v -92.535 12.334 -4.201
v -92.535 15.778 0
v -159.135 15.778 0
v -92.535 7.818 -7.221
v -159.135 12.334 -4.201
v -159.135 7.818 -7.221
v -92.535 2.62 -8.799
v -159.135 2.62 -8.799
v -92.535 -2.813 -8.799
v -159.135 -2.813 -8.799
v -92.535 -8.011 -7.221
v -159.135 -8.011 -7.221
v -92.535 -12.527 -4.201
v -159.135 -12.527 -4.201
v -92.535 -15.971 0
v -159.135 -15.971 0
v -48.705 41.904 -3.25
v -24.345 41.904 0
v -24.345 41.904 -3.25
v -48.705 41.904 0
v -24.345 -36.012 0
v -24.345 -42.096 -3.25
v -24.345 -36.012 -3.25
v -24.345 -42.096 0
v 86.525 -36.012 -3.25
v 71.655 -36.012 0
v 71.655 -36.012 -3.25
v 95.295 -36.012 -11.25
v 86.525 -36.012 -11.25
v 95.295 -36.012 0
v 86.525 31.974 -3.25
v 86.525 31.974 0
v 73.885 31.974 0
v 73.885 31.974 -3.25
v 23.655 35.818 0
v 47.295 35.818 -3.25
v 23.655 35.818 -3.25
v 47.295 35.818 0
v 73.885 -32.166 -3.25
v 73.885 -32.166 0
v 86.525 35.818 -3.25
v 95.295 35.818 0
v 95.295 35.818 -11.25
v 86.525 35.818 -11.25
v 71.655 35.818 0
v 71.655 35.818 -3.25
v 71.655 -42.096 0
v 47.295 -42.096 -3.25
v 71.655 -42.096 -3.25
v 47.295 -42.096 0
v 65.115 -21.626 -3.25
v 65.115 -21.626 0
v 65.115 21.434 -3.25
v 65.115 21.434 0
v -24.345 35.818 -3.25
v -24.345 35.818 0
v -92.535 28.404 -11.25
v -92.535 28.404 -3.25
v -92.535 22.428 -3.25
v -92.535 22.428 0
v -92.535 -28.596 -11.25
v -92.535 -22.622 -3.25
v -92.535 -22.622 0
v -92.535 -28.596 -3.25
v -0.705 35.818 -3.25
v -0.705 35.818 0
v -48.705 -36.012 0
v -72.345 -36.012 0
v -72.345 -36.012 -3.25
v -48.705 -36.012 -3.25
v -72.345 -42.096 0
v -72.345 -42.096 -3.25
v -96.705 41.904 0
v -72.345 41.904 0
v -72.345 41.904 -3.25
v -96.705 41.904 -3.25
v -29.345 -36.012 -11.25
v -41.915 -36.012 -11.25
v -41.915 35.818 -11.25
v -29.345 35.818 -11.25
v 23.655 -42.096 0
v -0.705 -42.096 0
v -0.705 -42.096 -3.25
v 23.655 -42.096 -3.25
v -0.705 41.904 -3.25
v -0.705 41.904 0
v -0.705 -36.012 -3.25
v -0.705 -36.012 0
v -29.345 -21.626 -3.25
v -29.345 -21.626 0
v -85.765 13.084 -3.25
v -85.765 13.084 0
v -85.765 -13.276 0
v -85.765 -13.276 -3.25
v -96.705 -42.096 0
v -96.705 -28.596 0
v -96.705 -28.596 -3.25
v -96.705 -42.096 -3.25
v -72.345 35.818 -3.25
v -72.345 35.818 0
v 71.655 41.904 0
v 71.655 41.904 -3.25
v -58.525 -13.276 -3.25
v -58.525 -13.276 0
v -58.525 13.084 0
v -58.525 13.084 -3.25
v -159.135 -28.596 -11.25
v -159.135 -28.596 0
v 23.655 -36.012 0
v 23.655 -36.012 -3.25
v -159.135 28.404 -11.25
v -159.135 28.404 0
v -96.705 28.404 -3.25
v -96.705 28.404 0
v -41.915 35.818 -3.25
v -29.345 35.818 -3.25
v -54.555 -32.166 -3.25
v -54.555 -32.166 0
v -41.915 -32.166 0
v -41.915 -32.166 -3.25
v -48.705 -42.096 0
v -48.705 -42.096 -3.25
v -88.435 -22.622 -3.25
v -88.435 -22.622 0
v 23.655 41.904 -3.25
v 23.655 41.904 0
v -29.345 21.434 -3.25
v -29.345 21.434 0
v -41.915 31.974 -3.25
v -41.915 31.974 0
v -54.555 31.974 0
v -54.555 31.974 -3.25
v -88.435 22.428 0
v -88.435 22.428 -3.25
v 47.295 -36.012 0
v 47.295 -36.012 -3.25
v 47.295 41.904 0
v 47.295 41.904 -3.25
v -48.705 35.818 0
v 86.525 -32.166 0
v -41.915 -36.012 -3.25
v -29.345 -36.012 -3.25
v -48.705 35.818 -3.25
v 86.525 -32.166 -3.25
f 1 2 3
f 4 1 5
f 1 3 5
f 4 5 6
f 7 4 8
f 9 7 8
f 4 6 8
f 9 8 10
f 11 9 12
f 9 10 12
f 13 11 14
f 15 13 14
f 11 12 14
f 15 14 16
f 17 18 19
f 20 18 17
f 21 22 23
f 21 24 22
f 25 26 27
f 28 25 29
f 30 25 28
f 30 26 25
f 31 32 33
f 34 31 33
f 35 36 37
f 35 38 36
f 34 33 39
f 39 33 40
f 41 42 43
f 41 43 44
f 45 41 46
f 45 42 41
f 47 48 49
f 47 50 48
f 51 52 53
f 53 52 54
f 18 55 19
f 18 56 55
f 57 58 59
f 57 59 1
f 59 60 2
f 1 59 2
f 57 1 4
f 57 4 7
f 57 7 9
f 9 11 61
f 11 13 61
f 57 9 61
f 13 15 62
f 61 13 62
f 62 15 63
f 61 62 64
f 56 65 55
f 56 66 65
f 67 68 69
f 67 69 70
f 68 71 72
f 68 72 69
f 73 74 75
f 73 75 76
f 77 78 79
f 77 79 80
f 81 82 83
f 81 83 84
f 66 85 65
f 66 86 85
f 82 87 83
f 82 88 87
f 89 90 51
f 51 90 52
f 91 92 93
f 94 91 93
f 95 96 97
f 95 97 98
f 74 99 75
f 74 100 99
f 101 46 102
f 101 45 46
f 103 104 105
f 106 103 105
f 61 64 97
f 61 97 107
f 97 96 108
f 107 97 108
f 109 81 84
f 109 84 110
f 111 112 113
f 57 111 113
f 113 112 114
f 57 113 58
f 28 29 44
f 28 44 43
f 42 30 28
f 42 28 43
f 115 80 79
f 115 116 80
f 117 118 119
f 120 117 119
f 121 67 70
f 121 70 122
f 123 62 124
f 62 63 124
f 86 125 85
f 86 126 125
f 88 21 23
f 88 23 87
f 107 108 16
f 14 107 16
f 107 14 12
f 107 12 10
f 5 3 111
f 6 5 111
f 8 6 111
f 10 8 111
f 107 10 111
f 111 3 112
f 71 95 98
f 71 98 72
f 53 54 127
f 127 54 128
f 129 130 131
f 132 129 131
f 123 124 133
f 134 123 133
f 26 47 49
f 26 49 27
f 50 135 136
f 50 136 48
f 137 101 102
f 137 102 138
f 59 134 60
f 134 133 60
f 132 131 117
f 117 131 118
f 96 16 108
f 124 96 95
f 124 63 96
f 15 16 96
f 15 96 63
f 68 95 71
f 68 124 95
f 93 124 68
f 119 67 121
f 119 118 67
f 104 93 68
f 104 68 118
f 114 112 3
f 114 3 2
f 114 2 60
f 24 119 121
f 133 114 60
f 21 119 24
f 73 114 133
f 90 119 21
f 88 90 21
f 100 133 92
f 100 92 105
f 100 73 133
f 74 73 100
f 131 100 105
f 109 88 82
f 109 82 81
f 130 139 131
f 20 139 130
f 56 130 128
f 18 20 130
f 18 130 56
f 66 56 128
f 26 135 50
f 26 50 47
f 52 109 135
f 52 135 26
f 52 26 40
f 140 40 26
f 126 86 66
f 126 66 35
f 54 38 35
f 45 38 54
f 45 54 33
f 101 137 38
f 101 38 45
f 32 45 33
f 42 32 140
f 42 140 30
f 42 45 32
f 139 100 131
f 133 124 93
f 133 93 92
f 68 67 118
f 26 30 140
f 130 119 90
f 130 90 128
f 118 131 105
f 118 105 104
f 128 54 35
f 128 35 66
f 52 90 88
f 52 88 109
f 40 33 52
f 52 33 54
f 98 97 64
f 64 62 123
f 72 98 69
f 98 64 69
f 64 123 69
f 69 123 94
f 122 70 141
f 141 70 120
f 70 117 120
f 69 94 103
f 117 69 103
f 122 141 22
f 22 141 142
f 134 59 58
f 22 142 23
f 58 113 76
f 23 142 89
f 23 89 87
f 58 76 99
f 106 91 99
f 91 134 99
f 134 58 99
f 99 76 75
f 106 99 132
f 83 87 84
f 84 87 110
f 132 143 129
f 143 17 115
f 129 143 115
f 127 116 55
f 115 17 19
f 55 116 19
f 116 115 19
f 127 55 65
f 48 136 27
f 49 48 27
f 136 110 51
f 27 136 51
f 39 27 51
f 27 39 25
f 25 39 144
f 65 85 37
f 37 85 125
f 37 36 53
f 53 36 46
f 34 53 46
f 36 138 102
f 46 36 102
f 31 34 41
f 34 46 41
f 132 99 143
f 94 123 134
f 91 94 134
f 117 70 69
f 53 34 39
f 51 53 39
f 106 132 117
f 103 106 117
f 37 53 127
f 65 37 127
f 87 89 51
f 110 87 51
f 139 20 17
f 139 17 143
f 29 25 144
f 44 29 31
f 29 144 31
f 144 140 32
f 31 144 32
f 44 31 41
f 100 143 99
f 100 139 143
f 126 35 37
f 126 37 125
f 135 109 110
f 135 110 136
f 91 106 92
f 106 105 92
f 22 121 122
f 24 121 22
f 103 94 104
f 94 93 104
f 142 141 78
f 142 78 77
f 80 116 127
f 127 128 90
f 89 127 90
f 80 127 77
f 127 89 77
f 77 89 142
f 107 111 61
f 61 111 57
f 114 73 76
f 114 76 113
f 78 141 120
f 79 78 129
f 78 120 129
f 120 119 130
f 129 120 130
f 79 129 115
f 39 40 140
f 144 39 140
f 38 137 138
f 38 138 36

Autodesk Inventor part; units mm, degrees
ref_plane "YZ Plane" through (0, 0, 0) normal (1, 0, 0) x (0, 1, 0)
ref_plane "XZ Plane" through (0, 0, 0) normal (0, 1, 0) x (-1, 0, 0)
ref_plane "XY Plane" through (0, 0, 0) normal (0, 0, 1) x (1, 0, 0)
sketch "Sketch1" plane through (0, 0, 0) normal (0, 0, 1) x (1, 0, 0)
  line L0 (-96.7048, 41.9035) -> (-96.7048, -42.0965)
  line L1 (-96.7048, -42.0965) -> (-72.3448, -42.0965)
  line L2 (-72.3448, -42.0965) -> (-72.3448, -36.0115)
  line L3 (-72.3448, -36.0115) -> (-48.7048, -36.0115)
  line L4 (-48.7048, -36.0115) -> (-48.7048, -42.0965)
  line L5 (-48.7048, -42.0965) -> (-24.3448, -42.0965)
  line L6 (-0.7048, -42.0965) -> (23.6552, -42.0965)
  line L7 (47.2952, -42.0965) -> (71.6552, -42.0965)
  line L8 (71.6552, -42.0965) -> (71.6552, -36.0115)
  line L9 (71.6552, -36.0115) -> (95.2952, -36.0115)
  line L10 (95.2952, -36.0115) -> (95.2952, 35.8185)
  line L11 (95.2952, 35.8185) -> (71.6552, 35.8185)
  line L12 (71.6552, 35.8185) -> (71.6552, 41.9035)
  line L13 (71.6552, 41.9035) -> (47.2952, 41.9035)
  line L14 (47.2952, 41.9035) -> (47.2952, 35.8185)
  line L15 (47.2952, 35.8185) -> (23.6552, 35.8185)
  line L16 (23.6552, 35.8185) -> (23.6552, 41.9035)
  line L17 (23.6552, 41.9035) -> (-0.7048, 41.9035)
  line L18 (-0.7048, 41.9035) -> (-0.7048, 35.8185)
  line L19 (-0.7048, 35.8185) -> (-24.3448, 35.8185)
  line L20 (-24.3448, 35.8185) -> (-24.3448, 41.9035)
  line L21 (-24.3448, 41.9035) -> (-48.7048, 41.9035)
  line L22 (-48.7048, 41.9035) -> (-48.7048, 35.8185)
  line L23 (-48.7048, 35.8185) -> (-72.3448, 35.8185)
  line L24 (-72.3448, 35.8185) -> (-72.3448, 41.9035)
  line L25 (-72.3448, 41.9035) -> (-96.7048, 41.9035)
  line L26 (-24.3448, -42.0965) -> (-24.3448, -36.0115)
  line L27 (-24.3448, -36.0115) -> (-0.7048, -36.0115)
  line L28 (-0.7048, -36.0115) -> (-0.7048, -42.0965)
  line L29 (23.6552, -42.0965) -> (23.6552, -36.0115)
  line L30 (23.6552, -36.0115) -> (47.2952, -36.0115)
  line L31 (47.2952, -36.0115) -> (47.2952, -42.0965)
  point P0 (0, 0)
  dimension "d0" = 84
  dimension "d1" = 24.36
  dimension "d2" = 23.64
  dimension "d3" = 24.36
  dimension "d5" = 24.36
  dimension "d8" = 23.64
  dimension "d9" = 71.83
  dimension "d10" = 23.64
  dimension "d11" = 6.085
  dimension "d12" = 6.085
  dimension "d13" = 6.085
  dimension "d14" = 24.36
  dimension "d15" = 23.64
  dimension "d16" = 24.36
  dimension "d17" = 23.64
  dimension "d18" = 24.36
  dimension "d19" = 23.64
  dimension "d20" = 24.36
  dimension "d21" = 23.64
  dimension "d22" = 23.64
extrude "Extrusion1" add sketch "Sketch1" against normal blind 3.25
sketch "Sketch2" plane through (0, 0, 0) normal (0, 0, 1) x (1, 0, 0)
  line L0 (-92.5348, 22.4285) -> (-92.5348, -22.6215)
  line L1 (-92.5348, -22.6215) -> (-88.4348, -22.6215)
  line L2 (-88.4348, -22.6215) -> (-88.4348, 22.4285)
  line L3 (-88.4348, 22.4285) -> (-92.5348, 22.4285)
  line L4 (-96.7048, 41.9035) -> (-96.7048, -42.0965) projected
  line L5 (-72.3448, 41.9035) -> (-96.7048, 41.9035) projected
  line L6 (-85.7648, 13.0835) -> (-85.7648, -13.2765)
  line L7 (-85.7648, -13.2765) -> (-58.5248, -13.2765)
  line L8 (-58.5248, -13.2765) -> (-58.5248, 13.0835)
  line L9 (-58.5248, 13.0835) -> (-85.7648, 13.0835)
  line L10 (-54.5548, 31.9735) -> (-54.5548, -32.1665)
  line L11 (-54.5548, -32.1665) -> (-41.9148, -32.1665)
  line L12 (-41.9148, -32.1665) -> (-41.9148, 31.9735)
  line L13 (-41.9148, 31.9735) -> (-54.5548, 31.9735)
  line L14 (-24.3448, 41.9035) -> (-48.7048, 41.9035) projected
  line L15 (-29.3448, 21.4335) -> (-29.3448, -21.6265)
  line L16 (-29.3448, -21.6265) -> (65.1152, -21.6265)
  line L17 (65.1152, -21.6265) -> (65.1152, 21.4335)
  line L18 (65.1152, 21.4335) -> (-29.3448, 21.4335)
  line L19 (73.8852, 31.9735) -> (73.8852, -32.1665)
  line L20 (73.8852, -32.1665) -> (86.5252, -32.1665)
  line L21 (86.5252, -32.1665) -> (86.5252, 31.9735)
  line L22 (71.6552, 35.8185) -> (95.2952, 35.8185) projected
  line L23 (86.5252, 31.9735) -> (73.8852, 31.9735)
  line L24 (95.2952, -36.0115) -> (95.2952, 35.8185) projected
  point P0 (0, 0)
  dimension "d25" = 4.17
  dimension "d26" = 4.1
  dimension "d27" = 45.05
  dimension "d28" = 19.475
  dimension "d29" = 10.94
  dimension "d30" = 26.36
  dimension "d31" = 27.24
  dimension "d32" = 42.15
  dimension "d33" = 28.82
  dimension "d34" = 64.14
  dimension "d35" = 12.64
  dimension "d36" = 9.93
  dimension "d37" = 67.36
  dimension "d38" = 43.06
  dimension "d39" = 94.46
  dimension "d40" = 20.47
  dimension "d41" = 64.14
  dimension "d42" = 12.64
  dimension "d43" = 3.845
  dimension "d44" = 8.77
extrude "Extrusion2" cut sketch "Sketch2" against normal blind 4
sketch "Sketch3" plane through (0, 0, 0) normal (0, 0, 1) x (1, 0, 0)
  line L0 (-121.7905, 18.4035) -> (-90.4348, 18.4035)
  line L1 (-90.4348, 18.4035) -> (-90.4348, -18.5965)
  line L2 (-88.4348, 22.4285) -> (-88.4348, -22.6215) projected
  line L3 (-90.4348, -18.5965) -> (-121.7905, -18.5965)
  line L4 (-121.7905, -18.5965) -> (-121.7905, 18.4035)
  line L5 (-72.3448, 41.9035) -> (-96.7048, 41.9035) projected
  point P0 (0, 0)
  dimension "d47" = 37
  dimension "d48" = 23.5
  dimension "d49" = 2
extrude "Extrusion3" cut sketch "Sketch3" against normal blind 4
sketch "Sketch9" plane through (0, 0, 0) normal (0, 0, 1) x (1, 0, 0)
  line L0 (-92.5348, 28.4035) -> (-92.5348, -28.5965)
  line L1 (-92.5348, -28.5965) -> (-159.1348, -28.5965)
  line L2 (-159.1348, -28.5965) -> (-159.1348, 28.4035)
  line L3 (-159.1348, 28.4035) -> (-92.5348, 28.4035)
  line L4 (-92.5348, 18.4035) -> (-92.5348, 22.4285) projected
  line L5 (-72.3448, 41.9035) -> (-96.7048, 41.9035) projected
  line L6 (-96.7048, -42.0965) -> (-72.3448, -42.0965) projected
  point P0 (0, 0)
  dimension "d64" = 0
  dimension "d65" = 13.5
  dimension "d66" = 13.5
  dimension "d67" = 66.6
extrude "Extrusion6" add sketch "Sketch9" against normal blind 11.25
sketch "Sketch10" plane through (-159.1348, -28.5965, 0) normal (-1, 0, 0) x (0, 0, 1)
  circle A0 centre (9.5, 28.5) radius 18.5
  line L0 (0, 70.5) -> (-3.25, 70.5) projected
  line L1 (-11.25, 0) -> (-11.25, 57) projected
  point P0 (0, 28.5965)
  dimension "d70" = 42
  dimension "d71" = 37
  dimension "d72" = 20.75
extrude "Extrusion7" cut sketch "Sketch10" against normal blind 66.6
sketch "Sketch11" plane through (0, 0, 0) normal (0, 0, 1) x (1, 0, 0)
  point P0 (0, 0)
sketch "Sketch12" plane through (0, 0, 0) normal (0, 0, 1) x (1, 0, 0)
  line L0 (86.5252, 35.8185) -> (86.5252, -36.0115)
  line L1 (86.5252, -36.0115) -> (95.2952, -36.0115)
  line L2 (95.2952, -36.0115) -> (95.2952, 35.8185)
  line L3 (95.2952, 35.8185) -> (86.5252, 35.8185)
  line L4 (95.2952, -36.0115) -> (95.2952, 35.8185) projected
  line L5 (95.2952, 35.8185) -> (71.6552, 35.8185) projected
  line L6 (86.5252, 31.9735) -> (86.5252, -32.1665) projected
  line L7 (71.6552, -36.0115) -> (95.2952, -36.0115) projected
  line L8 (-41.9148, 12.1175) -> (-41.9148, 35.8185)
  line L9 (-41.9148, 35.8185) -> (-41.9148, -36.0115)
  line L10 (-41.9148, -36.0115) -> (-29.3448, -36.0115)
  line L11 (-41.9148, 31.9735) -> (-41.9148, -32.1665) projected
  line L12 (-29.3448, -36.0115) -> (-29.3448, 35.8185)
  line L13 (-29.3448, -21.6265) -> (-29.3448, 21.4335) projected
  line L14 (-29.3448, 35.8185) -> (-41.9148, 35.8185)
  line L15 (-0.7048, 35.8185) -> (-24.3448, 35.8185) projected
  line L16 (-24.3448, -36.0115) -> (-0.7048, -36.0115) projected
  point P0 (0, 0)
  dimension "d75" = 0
  dimension "d76" = 0
  dimension "d77" = 0
  dimension "d78" = 0
  dimension "d79" = 0
  dimension "d80" = 0
  dimension "d81" = 0
  dimension "d82" = 0
extrude "Extrusion8" add sketch "Sketch12" against normal blind 11.25
properties part number "new base"
